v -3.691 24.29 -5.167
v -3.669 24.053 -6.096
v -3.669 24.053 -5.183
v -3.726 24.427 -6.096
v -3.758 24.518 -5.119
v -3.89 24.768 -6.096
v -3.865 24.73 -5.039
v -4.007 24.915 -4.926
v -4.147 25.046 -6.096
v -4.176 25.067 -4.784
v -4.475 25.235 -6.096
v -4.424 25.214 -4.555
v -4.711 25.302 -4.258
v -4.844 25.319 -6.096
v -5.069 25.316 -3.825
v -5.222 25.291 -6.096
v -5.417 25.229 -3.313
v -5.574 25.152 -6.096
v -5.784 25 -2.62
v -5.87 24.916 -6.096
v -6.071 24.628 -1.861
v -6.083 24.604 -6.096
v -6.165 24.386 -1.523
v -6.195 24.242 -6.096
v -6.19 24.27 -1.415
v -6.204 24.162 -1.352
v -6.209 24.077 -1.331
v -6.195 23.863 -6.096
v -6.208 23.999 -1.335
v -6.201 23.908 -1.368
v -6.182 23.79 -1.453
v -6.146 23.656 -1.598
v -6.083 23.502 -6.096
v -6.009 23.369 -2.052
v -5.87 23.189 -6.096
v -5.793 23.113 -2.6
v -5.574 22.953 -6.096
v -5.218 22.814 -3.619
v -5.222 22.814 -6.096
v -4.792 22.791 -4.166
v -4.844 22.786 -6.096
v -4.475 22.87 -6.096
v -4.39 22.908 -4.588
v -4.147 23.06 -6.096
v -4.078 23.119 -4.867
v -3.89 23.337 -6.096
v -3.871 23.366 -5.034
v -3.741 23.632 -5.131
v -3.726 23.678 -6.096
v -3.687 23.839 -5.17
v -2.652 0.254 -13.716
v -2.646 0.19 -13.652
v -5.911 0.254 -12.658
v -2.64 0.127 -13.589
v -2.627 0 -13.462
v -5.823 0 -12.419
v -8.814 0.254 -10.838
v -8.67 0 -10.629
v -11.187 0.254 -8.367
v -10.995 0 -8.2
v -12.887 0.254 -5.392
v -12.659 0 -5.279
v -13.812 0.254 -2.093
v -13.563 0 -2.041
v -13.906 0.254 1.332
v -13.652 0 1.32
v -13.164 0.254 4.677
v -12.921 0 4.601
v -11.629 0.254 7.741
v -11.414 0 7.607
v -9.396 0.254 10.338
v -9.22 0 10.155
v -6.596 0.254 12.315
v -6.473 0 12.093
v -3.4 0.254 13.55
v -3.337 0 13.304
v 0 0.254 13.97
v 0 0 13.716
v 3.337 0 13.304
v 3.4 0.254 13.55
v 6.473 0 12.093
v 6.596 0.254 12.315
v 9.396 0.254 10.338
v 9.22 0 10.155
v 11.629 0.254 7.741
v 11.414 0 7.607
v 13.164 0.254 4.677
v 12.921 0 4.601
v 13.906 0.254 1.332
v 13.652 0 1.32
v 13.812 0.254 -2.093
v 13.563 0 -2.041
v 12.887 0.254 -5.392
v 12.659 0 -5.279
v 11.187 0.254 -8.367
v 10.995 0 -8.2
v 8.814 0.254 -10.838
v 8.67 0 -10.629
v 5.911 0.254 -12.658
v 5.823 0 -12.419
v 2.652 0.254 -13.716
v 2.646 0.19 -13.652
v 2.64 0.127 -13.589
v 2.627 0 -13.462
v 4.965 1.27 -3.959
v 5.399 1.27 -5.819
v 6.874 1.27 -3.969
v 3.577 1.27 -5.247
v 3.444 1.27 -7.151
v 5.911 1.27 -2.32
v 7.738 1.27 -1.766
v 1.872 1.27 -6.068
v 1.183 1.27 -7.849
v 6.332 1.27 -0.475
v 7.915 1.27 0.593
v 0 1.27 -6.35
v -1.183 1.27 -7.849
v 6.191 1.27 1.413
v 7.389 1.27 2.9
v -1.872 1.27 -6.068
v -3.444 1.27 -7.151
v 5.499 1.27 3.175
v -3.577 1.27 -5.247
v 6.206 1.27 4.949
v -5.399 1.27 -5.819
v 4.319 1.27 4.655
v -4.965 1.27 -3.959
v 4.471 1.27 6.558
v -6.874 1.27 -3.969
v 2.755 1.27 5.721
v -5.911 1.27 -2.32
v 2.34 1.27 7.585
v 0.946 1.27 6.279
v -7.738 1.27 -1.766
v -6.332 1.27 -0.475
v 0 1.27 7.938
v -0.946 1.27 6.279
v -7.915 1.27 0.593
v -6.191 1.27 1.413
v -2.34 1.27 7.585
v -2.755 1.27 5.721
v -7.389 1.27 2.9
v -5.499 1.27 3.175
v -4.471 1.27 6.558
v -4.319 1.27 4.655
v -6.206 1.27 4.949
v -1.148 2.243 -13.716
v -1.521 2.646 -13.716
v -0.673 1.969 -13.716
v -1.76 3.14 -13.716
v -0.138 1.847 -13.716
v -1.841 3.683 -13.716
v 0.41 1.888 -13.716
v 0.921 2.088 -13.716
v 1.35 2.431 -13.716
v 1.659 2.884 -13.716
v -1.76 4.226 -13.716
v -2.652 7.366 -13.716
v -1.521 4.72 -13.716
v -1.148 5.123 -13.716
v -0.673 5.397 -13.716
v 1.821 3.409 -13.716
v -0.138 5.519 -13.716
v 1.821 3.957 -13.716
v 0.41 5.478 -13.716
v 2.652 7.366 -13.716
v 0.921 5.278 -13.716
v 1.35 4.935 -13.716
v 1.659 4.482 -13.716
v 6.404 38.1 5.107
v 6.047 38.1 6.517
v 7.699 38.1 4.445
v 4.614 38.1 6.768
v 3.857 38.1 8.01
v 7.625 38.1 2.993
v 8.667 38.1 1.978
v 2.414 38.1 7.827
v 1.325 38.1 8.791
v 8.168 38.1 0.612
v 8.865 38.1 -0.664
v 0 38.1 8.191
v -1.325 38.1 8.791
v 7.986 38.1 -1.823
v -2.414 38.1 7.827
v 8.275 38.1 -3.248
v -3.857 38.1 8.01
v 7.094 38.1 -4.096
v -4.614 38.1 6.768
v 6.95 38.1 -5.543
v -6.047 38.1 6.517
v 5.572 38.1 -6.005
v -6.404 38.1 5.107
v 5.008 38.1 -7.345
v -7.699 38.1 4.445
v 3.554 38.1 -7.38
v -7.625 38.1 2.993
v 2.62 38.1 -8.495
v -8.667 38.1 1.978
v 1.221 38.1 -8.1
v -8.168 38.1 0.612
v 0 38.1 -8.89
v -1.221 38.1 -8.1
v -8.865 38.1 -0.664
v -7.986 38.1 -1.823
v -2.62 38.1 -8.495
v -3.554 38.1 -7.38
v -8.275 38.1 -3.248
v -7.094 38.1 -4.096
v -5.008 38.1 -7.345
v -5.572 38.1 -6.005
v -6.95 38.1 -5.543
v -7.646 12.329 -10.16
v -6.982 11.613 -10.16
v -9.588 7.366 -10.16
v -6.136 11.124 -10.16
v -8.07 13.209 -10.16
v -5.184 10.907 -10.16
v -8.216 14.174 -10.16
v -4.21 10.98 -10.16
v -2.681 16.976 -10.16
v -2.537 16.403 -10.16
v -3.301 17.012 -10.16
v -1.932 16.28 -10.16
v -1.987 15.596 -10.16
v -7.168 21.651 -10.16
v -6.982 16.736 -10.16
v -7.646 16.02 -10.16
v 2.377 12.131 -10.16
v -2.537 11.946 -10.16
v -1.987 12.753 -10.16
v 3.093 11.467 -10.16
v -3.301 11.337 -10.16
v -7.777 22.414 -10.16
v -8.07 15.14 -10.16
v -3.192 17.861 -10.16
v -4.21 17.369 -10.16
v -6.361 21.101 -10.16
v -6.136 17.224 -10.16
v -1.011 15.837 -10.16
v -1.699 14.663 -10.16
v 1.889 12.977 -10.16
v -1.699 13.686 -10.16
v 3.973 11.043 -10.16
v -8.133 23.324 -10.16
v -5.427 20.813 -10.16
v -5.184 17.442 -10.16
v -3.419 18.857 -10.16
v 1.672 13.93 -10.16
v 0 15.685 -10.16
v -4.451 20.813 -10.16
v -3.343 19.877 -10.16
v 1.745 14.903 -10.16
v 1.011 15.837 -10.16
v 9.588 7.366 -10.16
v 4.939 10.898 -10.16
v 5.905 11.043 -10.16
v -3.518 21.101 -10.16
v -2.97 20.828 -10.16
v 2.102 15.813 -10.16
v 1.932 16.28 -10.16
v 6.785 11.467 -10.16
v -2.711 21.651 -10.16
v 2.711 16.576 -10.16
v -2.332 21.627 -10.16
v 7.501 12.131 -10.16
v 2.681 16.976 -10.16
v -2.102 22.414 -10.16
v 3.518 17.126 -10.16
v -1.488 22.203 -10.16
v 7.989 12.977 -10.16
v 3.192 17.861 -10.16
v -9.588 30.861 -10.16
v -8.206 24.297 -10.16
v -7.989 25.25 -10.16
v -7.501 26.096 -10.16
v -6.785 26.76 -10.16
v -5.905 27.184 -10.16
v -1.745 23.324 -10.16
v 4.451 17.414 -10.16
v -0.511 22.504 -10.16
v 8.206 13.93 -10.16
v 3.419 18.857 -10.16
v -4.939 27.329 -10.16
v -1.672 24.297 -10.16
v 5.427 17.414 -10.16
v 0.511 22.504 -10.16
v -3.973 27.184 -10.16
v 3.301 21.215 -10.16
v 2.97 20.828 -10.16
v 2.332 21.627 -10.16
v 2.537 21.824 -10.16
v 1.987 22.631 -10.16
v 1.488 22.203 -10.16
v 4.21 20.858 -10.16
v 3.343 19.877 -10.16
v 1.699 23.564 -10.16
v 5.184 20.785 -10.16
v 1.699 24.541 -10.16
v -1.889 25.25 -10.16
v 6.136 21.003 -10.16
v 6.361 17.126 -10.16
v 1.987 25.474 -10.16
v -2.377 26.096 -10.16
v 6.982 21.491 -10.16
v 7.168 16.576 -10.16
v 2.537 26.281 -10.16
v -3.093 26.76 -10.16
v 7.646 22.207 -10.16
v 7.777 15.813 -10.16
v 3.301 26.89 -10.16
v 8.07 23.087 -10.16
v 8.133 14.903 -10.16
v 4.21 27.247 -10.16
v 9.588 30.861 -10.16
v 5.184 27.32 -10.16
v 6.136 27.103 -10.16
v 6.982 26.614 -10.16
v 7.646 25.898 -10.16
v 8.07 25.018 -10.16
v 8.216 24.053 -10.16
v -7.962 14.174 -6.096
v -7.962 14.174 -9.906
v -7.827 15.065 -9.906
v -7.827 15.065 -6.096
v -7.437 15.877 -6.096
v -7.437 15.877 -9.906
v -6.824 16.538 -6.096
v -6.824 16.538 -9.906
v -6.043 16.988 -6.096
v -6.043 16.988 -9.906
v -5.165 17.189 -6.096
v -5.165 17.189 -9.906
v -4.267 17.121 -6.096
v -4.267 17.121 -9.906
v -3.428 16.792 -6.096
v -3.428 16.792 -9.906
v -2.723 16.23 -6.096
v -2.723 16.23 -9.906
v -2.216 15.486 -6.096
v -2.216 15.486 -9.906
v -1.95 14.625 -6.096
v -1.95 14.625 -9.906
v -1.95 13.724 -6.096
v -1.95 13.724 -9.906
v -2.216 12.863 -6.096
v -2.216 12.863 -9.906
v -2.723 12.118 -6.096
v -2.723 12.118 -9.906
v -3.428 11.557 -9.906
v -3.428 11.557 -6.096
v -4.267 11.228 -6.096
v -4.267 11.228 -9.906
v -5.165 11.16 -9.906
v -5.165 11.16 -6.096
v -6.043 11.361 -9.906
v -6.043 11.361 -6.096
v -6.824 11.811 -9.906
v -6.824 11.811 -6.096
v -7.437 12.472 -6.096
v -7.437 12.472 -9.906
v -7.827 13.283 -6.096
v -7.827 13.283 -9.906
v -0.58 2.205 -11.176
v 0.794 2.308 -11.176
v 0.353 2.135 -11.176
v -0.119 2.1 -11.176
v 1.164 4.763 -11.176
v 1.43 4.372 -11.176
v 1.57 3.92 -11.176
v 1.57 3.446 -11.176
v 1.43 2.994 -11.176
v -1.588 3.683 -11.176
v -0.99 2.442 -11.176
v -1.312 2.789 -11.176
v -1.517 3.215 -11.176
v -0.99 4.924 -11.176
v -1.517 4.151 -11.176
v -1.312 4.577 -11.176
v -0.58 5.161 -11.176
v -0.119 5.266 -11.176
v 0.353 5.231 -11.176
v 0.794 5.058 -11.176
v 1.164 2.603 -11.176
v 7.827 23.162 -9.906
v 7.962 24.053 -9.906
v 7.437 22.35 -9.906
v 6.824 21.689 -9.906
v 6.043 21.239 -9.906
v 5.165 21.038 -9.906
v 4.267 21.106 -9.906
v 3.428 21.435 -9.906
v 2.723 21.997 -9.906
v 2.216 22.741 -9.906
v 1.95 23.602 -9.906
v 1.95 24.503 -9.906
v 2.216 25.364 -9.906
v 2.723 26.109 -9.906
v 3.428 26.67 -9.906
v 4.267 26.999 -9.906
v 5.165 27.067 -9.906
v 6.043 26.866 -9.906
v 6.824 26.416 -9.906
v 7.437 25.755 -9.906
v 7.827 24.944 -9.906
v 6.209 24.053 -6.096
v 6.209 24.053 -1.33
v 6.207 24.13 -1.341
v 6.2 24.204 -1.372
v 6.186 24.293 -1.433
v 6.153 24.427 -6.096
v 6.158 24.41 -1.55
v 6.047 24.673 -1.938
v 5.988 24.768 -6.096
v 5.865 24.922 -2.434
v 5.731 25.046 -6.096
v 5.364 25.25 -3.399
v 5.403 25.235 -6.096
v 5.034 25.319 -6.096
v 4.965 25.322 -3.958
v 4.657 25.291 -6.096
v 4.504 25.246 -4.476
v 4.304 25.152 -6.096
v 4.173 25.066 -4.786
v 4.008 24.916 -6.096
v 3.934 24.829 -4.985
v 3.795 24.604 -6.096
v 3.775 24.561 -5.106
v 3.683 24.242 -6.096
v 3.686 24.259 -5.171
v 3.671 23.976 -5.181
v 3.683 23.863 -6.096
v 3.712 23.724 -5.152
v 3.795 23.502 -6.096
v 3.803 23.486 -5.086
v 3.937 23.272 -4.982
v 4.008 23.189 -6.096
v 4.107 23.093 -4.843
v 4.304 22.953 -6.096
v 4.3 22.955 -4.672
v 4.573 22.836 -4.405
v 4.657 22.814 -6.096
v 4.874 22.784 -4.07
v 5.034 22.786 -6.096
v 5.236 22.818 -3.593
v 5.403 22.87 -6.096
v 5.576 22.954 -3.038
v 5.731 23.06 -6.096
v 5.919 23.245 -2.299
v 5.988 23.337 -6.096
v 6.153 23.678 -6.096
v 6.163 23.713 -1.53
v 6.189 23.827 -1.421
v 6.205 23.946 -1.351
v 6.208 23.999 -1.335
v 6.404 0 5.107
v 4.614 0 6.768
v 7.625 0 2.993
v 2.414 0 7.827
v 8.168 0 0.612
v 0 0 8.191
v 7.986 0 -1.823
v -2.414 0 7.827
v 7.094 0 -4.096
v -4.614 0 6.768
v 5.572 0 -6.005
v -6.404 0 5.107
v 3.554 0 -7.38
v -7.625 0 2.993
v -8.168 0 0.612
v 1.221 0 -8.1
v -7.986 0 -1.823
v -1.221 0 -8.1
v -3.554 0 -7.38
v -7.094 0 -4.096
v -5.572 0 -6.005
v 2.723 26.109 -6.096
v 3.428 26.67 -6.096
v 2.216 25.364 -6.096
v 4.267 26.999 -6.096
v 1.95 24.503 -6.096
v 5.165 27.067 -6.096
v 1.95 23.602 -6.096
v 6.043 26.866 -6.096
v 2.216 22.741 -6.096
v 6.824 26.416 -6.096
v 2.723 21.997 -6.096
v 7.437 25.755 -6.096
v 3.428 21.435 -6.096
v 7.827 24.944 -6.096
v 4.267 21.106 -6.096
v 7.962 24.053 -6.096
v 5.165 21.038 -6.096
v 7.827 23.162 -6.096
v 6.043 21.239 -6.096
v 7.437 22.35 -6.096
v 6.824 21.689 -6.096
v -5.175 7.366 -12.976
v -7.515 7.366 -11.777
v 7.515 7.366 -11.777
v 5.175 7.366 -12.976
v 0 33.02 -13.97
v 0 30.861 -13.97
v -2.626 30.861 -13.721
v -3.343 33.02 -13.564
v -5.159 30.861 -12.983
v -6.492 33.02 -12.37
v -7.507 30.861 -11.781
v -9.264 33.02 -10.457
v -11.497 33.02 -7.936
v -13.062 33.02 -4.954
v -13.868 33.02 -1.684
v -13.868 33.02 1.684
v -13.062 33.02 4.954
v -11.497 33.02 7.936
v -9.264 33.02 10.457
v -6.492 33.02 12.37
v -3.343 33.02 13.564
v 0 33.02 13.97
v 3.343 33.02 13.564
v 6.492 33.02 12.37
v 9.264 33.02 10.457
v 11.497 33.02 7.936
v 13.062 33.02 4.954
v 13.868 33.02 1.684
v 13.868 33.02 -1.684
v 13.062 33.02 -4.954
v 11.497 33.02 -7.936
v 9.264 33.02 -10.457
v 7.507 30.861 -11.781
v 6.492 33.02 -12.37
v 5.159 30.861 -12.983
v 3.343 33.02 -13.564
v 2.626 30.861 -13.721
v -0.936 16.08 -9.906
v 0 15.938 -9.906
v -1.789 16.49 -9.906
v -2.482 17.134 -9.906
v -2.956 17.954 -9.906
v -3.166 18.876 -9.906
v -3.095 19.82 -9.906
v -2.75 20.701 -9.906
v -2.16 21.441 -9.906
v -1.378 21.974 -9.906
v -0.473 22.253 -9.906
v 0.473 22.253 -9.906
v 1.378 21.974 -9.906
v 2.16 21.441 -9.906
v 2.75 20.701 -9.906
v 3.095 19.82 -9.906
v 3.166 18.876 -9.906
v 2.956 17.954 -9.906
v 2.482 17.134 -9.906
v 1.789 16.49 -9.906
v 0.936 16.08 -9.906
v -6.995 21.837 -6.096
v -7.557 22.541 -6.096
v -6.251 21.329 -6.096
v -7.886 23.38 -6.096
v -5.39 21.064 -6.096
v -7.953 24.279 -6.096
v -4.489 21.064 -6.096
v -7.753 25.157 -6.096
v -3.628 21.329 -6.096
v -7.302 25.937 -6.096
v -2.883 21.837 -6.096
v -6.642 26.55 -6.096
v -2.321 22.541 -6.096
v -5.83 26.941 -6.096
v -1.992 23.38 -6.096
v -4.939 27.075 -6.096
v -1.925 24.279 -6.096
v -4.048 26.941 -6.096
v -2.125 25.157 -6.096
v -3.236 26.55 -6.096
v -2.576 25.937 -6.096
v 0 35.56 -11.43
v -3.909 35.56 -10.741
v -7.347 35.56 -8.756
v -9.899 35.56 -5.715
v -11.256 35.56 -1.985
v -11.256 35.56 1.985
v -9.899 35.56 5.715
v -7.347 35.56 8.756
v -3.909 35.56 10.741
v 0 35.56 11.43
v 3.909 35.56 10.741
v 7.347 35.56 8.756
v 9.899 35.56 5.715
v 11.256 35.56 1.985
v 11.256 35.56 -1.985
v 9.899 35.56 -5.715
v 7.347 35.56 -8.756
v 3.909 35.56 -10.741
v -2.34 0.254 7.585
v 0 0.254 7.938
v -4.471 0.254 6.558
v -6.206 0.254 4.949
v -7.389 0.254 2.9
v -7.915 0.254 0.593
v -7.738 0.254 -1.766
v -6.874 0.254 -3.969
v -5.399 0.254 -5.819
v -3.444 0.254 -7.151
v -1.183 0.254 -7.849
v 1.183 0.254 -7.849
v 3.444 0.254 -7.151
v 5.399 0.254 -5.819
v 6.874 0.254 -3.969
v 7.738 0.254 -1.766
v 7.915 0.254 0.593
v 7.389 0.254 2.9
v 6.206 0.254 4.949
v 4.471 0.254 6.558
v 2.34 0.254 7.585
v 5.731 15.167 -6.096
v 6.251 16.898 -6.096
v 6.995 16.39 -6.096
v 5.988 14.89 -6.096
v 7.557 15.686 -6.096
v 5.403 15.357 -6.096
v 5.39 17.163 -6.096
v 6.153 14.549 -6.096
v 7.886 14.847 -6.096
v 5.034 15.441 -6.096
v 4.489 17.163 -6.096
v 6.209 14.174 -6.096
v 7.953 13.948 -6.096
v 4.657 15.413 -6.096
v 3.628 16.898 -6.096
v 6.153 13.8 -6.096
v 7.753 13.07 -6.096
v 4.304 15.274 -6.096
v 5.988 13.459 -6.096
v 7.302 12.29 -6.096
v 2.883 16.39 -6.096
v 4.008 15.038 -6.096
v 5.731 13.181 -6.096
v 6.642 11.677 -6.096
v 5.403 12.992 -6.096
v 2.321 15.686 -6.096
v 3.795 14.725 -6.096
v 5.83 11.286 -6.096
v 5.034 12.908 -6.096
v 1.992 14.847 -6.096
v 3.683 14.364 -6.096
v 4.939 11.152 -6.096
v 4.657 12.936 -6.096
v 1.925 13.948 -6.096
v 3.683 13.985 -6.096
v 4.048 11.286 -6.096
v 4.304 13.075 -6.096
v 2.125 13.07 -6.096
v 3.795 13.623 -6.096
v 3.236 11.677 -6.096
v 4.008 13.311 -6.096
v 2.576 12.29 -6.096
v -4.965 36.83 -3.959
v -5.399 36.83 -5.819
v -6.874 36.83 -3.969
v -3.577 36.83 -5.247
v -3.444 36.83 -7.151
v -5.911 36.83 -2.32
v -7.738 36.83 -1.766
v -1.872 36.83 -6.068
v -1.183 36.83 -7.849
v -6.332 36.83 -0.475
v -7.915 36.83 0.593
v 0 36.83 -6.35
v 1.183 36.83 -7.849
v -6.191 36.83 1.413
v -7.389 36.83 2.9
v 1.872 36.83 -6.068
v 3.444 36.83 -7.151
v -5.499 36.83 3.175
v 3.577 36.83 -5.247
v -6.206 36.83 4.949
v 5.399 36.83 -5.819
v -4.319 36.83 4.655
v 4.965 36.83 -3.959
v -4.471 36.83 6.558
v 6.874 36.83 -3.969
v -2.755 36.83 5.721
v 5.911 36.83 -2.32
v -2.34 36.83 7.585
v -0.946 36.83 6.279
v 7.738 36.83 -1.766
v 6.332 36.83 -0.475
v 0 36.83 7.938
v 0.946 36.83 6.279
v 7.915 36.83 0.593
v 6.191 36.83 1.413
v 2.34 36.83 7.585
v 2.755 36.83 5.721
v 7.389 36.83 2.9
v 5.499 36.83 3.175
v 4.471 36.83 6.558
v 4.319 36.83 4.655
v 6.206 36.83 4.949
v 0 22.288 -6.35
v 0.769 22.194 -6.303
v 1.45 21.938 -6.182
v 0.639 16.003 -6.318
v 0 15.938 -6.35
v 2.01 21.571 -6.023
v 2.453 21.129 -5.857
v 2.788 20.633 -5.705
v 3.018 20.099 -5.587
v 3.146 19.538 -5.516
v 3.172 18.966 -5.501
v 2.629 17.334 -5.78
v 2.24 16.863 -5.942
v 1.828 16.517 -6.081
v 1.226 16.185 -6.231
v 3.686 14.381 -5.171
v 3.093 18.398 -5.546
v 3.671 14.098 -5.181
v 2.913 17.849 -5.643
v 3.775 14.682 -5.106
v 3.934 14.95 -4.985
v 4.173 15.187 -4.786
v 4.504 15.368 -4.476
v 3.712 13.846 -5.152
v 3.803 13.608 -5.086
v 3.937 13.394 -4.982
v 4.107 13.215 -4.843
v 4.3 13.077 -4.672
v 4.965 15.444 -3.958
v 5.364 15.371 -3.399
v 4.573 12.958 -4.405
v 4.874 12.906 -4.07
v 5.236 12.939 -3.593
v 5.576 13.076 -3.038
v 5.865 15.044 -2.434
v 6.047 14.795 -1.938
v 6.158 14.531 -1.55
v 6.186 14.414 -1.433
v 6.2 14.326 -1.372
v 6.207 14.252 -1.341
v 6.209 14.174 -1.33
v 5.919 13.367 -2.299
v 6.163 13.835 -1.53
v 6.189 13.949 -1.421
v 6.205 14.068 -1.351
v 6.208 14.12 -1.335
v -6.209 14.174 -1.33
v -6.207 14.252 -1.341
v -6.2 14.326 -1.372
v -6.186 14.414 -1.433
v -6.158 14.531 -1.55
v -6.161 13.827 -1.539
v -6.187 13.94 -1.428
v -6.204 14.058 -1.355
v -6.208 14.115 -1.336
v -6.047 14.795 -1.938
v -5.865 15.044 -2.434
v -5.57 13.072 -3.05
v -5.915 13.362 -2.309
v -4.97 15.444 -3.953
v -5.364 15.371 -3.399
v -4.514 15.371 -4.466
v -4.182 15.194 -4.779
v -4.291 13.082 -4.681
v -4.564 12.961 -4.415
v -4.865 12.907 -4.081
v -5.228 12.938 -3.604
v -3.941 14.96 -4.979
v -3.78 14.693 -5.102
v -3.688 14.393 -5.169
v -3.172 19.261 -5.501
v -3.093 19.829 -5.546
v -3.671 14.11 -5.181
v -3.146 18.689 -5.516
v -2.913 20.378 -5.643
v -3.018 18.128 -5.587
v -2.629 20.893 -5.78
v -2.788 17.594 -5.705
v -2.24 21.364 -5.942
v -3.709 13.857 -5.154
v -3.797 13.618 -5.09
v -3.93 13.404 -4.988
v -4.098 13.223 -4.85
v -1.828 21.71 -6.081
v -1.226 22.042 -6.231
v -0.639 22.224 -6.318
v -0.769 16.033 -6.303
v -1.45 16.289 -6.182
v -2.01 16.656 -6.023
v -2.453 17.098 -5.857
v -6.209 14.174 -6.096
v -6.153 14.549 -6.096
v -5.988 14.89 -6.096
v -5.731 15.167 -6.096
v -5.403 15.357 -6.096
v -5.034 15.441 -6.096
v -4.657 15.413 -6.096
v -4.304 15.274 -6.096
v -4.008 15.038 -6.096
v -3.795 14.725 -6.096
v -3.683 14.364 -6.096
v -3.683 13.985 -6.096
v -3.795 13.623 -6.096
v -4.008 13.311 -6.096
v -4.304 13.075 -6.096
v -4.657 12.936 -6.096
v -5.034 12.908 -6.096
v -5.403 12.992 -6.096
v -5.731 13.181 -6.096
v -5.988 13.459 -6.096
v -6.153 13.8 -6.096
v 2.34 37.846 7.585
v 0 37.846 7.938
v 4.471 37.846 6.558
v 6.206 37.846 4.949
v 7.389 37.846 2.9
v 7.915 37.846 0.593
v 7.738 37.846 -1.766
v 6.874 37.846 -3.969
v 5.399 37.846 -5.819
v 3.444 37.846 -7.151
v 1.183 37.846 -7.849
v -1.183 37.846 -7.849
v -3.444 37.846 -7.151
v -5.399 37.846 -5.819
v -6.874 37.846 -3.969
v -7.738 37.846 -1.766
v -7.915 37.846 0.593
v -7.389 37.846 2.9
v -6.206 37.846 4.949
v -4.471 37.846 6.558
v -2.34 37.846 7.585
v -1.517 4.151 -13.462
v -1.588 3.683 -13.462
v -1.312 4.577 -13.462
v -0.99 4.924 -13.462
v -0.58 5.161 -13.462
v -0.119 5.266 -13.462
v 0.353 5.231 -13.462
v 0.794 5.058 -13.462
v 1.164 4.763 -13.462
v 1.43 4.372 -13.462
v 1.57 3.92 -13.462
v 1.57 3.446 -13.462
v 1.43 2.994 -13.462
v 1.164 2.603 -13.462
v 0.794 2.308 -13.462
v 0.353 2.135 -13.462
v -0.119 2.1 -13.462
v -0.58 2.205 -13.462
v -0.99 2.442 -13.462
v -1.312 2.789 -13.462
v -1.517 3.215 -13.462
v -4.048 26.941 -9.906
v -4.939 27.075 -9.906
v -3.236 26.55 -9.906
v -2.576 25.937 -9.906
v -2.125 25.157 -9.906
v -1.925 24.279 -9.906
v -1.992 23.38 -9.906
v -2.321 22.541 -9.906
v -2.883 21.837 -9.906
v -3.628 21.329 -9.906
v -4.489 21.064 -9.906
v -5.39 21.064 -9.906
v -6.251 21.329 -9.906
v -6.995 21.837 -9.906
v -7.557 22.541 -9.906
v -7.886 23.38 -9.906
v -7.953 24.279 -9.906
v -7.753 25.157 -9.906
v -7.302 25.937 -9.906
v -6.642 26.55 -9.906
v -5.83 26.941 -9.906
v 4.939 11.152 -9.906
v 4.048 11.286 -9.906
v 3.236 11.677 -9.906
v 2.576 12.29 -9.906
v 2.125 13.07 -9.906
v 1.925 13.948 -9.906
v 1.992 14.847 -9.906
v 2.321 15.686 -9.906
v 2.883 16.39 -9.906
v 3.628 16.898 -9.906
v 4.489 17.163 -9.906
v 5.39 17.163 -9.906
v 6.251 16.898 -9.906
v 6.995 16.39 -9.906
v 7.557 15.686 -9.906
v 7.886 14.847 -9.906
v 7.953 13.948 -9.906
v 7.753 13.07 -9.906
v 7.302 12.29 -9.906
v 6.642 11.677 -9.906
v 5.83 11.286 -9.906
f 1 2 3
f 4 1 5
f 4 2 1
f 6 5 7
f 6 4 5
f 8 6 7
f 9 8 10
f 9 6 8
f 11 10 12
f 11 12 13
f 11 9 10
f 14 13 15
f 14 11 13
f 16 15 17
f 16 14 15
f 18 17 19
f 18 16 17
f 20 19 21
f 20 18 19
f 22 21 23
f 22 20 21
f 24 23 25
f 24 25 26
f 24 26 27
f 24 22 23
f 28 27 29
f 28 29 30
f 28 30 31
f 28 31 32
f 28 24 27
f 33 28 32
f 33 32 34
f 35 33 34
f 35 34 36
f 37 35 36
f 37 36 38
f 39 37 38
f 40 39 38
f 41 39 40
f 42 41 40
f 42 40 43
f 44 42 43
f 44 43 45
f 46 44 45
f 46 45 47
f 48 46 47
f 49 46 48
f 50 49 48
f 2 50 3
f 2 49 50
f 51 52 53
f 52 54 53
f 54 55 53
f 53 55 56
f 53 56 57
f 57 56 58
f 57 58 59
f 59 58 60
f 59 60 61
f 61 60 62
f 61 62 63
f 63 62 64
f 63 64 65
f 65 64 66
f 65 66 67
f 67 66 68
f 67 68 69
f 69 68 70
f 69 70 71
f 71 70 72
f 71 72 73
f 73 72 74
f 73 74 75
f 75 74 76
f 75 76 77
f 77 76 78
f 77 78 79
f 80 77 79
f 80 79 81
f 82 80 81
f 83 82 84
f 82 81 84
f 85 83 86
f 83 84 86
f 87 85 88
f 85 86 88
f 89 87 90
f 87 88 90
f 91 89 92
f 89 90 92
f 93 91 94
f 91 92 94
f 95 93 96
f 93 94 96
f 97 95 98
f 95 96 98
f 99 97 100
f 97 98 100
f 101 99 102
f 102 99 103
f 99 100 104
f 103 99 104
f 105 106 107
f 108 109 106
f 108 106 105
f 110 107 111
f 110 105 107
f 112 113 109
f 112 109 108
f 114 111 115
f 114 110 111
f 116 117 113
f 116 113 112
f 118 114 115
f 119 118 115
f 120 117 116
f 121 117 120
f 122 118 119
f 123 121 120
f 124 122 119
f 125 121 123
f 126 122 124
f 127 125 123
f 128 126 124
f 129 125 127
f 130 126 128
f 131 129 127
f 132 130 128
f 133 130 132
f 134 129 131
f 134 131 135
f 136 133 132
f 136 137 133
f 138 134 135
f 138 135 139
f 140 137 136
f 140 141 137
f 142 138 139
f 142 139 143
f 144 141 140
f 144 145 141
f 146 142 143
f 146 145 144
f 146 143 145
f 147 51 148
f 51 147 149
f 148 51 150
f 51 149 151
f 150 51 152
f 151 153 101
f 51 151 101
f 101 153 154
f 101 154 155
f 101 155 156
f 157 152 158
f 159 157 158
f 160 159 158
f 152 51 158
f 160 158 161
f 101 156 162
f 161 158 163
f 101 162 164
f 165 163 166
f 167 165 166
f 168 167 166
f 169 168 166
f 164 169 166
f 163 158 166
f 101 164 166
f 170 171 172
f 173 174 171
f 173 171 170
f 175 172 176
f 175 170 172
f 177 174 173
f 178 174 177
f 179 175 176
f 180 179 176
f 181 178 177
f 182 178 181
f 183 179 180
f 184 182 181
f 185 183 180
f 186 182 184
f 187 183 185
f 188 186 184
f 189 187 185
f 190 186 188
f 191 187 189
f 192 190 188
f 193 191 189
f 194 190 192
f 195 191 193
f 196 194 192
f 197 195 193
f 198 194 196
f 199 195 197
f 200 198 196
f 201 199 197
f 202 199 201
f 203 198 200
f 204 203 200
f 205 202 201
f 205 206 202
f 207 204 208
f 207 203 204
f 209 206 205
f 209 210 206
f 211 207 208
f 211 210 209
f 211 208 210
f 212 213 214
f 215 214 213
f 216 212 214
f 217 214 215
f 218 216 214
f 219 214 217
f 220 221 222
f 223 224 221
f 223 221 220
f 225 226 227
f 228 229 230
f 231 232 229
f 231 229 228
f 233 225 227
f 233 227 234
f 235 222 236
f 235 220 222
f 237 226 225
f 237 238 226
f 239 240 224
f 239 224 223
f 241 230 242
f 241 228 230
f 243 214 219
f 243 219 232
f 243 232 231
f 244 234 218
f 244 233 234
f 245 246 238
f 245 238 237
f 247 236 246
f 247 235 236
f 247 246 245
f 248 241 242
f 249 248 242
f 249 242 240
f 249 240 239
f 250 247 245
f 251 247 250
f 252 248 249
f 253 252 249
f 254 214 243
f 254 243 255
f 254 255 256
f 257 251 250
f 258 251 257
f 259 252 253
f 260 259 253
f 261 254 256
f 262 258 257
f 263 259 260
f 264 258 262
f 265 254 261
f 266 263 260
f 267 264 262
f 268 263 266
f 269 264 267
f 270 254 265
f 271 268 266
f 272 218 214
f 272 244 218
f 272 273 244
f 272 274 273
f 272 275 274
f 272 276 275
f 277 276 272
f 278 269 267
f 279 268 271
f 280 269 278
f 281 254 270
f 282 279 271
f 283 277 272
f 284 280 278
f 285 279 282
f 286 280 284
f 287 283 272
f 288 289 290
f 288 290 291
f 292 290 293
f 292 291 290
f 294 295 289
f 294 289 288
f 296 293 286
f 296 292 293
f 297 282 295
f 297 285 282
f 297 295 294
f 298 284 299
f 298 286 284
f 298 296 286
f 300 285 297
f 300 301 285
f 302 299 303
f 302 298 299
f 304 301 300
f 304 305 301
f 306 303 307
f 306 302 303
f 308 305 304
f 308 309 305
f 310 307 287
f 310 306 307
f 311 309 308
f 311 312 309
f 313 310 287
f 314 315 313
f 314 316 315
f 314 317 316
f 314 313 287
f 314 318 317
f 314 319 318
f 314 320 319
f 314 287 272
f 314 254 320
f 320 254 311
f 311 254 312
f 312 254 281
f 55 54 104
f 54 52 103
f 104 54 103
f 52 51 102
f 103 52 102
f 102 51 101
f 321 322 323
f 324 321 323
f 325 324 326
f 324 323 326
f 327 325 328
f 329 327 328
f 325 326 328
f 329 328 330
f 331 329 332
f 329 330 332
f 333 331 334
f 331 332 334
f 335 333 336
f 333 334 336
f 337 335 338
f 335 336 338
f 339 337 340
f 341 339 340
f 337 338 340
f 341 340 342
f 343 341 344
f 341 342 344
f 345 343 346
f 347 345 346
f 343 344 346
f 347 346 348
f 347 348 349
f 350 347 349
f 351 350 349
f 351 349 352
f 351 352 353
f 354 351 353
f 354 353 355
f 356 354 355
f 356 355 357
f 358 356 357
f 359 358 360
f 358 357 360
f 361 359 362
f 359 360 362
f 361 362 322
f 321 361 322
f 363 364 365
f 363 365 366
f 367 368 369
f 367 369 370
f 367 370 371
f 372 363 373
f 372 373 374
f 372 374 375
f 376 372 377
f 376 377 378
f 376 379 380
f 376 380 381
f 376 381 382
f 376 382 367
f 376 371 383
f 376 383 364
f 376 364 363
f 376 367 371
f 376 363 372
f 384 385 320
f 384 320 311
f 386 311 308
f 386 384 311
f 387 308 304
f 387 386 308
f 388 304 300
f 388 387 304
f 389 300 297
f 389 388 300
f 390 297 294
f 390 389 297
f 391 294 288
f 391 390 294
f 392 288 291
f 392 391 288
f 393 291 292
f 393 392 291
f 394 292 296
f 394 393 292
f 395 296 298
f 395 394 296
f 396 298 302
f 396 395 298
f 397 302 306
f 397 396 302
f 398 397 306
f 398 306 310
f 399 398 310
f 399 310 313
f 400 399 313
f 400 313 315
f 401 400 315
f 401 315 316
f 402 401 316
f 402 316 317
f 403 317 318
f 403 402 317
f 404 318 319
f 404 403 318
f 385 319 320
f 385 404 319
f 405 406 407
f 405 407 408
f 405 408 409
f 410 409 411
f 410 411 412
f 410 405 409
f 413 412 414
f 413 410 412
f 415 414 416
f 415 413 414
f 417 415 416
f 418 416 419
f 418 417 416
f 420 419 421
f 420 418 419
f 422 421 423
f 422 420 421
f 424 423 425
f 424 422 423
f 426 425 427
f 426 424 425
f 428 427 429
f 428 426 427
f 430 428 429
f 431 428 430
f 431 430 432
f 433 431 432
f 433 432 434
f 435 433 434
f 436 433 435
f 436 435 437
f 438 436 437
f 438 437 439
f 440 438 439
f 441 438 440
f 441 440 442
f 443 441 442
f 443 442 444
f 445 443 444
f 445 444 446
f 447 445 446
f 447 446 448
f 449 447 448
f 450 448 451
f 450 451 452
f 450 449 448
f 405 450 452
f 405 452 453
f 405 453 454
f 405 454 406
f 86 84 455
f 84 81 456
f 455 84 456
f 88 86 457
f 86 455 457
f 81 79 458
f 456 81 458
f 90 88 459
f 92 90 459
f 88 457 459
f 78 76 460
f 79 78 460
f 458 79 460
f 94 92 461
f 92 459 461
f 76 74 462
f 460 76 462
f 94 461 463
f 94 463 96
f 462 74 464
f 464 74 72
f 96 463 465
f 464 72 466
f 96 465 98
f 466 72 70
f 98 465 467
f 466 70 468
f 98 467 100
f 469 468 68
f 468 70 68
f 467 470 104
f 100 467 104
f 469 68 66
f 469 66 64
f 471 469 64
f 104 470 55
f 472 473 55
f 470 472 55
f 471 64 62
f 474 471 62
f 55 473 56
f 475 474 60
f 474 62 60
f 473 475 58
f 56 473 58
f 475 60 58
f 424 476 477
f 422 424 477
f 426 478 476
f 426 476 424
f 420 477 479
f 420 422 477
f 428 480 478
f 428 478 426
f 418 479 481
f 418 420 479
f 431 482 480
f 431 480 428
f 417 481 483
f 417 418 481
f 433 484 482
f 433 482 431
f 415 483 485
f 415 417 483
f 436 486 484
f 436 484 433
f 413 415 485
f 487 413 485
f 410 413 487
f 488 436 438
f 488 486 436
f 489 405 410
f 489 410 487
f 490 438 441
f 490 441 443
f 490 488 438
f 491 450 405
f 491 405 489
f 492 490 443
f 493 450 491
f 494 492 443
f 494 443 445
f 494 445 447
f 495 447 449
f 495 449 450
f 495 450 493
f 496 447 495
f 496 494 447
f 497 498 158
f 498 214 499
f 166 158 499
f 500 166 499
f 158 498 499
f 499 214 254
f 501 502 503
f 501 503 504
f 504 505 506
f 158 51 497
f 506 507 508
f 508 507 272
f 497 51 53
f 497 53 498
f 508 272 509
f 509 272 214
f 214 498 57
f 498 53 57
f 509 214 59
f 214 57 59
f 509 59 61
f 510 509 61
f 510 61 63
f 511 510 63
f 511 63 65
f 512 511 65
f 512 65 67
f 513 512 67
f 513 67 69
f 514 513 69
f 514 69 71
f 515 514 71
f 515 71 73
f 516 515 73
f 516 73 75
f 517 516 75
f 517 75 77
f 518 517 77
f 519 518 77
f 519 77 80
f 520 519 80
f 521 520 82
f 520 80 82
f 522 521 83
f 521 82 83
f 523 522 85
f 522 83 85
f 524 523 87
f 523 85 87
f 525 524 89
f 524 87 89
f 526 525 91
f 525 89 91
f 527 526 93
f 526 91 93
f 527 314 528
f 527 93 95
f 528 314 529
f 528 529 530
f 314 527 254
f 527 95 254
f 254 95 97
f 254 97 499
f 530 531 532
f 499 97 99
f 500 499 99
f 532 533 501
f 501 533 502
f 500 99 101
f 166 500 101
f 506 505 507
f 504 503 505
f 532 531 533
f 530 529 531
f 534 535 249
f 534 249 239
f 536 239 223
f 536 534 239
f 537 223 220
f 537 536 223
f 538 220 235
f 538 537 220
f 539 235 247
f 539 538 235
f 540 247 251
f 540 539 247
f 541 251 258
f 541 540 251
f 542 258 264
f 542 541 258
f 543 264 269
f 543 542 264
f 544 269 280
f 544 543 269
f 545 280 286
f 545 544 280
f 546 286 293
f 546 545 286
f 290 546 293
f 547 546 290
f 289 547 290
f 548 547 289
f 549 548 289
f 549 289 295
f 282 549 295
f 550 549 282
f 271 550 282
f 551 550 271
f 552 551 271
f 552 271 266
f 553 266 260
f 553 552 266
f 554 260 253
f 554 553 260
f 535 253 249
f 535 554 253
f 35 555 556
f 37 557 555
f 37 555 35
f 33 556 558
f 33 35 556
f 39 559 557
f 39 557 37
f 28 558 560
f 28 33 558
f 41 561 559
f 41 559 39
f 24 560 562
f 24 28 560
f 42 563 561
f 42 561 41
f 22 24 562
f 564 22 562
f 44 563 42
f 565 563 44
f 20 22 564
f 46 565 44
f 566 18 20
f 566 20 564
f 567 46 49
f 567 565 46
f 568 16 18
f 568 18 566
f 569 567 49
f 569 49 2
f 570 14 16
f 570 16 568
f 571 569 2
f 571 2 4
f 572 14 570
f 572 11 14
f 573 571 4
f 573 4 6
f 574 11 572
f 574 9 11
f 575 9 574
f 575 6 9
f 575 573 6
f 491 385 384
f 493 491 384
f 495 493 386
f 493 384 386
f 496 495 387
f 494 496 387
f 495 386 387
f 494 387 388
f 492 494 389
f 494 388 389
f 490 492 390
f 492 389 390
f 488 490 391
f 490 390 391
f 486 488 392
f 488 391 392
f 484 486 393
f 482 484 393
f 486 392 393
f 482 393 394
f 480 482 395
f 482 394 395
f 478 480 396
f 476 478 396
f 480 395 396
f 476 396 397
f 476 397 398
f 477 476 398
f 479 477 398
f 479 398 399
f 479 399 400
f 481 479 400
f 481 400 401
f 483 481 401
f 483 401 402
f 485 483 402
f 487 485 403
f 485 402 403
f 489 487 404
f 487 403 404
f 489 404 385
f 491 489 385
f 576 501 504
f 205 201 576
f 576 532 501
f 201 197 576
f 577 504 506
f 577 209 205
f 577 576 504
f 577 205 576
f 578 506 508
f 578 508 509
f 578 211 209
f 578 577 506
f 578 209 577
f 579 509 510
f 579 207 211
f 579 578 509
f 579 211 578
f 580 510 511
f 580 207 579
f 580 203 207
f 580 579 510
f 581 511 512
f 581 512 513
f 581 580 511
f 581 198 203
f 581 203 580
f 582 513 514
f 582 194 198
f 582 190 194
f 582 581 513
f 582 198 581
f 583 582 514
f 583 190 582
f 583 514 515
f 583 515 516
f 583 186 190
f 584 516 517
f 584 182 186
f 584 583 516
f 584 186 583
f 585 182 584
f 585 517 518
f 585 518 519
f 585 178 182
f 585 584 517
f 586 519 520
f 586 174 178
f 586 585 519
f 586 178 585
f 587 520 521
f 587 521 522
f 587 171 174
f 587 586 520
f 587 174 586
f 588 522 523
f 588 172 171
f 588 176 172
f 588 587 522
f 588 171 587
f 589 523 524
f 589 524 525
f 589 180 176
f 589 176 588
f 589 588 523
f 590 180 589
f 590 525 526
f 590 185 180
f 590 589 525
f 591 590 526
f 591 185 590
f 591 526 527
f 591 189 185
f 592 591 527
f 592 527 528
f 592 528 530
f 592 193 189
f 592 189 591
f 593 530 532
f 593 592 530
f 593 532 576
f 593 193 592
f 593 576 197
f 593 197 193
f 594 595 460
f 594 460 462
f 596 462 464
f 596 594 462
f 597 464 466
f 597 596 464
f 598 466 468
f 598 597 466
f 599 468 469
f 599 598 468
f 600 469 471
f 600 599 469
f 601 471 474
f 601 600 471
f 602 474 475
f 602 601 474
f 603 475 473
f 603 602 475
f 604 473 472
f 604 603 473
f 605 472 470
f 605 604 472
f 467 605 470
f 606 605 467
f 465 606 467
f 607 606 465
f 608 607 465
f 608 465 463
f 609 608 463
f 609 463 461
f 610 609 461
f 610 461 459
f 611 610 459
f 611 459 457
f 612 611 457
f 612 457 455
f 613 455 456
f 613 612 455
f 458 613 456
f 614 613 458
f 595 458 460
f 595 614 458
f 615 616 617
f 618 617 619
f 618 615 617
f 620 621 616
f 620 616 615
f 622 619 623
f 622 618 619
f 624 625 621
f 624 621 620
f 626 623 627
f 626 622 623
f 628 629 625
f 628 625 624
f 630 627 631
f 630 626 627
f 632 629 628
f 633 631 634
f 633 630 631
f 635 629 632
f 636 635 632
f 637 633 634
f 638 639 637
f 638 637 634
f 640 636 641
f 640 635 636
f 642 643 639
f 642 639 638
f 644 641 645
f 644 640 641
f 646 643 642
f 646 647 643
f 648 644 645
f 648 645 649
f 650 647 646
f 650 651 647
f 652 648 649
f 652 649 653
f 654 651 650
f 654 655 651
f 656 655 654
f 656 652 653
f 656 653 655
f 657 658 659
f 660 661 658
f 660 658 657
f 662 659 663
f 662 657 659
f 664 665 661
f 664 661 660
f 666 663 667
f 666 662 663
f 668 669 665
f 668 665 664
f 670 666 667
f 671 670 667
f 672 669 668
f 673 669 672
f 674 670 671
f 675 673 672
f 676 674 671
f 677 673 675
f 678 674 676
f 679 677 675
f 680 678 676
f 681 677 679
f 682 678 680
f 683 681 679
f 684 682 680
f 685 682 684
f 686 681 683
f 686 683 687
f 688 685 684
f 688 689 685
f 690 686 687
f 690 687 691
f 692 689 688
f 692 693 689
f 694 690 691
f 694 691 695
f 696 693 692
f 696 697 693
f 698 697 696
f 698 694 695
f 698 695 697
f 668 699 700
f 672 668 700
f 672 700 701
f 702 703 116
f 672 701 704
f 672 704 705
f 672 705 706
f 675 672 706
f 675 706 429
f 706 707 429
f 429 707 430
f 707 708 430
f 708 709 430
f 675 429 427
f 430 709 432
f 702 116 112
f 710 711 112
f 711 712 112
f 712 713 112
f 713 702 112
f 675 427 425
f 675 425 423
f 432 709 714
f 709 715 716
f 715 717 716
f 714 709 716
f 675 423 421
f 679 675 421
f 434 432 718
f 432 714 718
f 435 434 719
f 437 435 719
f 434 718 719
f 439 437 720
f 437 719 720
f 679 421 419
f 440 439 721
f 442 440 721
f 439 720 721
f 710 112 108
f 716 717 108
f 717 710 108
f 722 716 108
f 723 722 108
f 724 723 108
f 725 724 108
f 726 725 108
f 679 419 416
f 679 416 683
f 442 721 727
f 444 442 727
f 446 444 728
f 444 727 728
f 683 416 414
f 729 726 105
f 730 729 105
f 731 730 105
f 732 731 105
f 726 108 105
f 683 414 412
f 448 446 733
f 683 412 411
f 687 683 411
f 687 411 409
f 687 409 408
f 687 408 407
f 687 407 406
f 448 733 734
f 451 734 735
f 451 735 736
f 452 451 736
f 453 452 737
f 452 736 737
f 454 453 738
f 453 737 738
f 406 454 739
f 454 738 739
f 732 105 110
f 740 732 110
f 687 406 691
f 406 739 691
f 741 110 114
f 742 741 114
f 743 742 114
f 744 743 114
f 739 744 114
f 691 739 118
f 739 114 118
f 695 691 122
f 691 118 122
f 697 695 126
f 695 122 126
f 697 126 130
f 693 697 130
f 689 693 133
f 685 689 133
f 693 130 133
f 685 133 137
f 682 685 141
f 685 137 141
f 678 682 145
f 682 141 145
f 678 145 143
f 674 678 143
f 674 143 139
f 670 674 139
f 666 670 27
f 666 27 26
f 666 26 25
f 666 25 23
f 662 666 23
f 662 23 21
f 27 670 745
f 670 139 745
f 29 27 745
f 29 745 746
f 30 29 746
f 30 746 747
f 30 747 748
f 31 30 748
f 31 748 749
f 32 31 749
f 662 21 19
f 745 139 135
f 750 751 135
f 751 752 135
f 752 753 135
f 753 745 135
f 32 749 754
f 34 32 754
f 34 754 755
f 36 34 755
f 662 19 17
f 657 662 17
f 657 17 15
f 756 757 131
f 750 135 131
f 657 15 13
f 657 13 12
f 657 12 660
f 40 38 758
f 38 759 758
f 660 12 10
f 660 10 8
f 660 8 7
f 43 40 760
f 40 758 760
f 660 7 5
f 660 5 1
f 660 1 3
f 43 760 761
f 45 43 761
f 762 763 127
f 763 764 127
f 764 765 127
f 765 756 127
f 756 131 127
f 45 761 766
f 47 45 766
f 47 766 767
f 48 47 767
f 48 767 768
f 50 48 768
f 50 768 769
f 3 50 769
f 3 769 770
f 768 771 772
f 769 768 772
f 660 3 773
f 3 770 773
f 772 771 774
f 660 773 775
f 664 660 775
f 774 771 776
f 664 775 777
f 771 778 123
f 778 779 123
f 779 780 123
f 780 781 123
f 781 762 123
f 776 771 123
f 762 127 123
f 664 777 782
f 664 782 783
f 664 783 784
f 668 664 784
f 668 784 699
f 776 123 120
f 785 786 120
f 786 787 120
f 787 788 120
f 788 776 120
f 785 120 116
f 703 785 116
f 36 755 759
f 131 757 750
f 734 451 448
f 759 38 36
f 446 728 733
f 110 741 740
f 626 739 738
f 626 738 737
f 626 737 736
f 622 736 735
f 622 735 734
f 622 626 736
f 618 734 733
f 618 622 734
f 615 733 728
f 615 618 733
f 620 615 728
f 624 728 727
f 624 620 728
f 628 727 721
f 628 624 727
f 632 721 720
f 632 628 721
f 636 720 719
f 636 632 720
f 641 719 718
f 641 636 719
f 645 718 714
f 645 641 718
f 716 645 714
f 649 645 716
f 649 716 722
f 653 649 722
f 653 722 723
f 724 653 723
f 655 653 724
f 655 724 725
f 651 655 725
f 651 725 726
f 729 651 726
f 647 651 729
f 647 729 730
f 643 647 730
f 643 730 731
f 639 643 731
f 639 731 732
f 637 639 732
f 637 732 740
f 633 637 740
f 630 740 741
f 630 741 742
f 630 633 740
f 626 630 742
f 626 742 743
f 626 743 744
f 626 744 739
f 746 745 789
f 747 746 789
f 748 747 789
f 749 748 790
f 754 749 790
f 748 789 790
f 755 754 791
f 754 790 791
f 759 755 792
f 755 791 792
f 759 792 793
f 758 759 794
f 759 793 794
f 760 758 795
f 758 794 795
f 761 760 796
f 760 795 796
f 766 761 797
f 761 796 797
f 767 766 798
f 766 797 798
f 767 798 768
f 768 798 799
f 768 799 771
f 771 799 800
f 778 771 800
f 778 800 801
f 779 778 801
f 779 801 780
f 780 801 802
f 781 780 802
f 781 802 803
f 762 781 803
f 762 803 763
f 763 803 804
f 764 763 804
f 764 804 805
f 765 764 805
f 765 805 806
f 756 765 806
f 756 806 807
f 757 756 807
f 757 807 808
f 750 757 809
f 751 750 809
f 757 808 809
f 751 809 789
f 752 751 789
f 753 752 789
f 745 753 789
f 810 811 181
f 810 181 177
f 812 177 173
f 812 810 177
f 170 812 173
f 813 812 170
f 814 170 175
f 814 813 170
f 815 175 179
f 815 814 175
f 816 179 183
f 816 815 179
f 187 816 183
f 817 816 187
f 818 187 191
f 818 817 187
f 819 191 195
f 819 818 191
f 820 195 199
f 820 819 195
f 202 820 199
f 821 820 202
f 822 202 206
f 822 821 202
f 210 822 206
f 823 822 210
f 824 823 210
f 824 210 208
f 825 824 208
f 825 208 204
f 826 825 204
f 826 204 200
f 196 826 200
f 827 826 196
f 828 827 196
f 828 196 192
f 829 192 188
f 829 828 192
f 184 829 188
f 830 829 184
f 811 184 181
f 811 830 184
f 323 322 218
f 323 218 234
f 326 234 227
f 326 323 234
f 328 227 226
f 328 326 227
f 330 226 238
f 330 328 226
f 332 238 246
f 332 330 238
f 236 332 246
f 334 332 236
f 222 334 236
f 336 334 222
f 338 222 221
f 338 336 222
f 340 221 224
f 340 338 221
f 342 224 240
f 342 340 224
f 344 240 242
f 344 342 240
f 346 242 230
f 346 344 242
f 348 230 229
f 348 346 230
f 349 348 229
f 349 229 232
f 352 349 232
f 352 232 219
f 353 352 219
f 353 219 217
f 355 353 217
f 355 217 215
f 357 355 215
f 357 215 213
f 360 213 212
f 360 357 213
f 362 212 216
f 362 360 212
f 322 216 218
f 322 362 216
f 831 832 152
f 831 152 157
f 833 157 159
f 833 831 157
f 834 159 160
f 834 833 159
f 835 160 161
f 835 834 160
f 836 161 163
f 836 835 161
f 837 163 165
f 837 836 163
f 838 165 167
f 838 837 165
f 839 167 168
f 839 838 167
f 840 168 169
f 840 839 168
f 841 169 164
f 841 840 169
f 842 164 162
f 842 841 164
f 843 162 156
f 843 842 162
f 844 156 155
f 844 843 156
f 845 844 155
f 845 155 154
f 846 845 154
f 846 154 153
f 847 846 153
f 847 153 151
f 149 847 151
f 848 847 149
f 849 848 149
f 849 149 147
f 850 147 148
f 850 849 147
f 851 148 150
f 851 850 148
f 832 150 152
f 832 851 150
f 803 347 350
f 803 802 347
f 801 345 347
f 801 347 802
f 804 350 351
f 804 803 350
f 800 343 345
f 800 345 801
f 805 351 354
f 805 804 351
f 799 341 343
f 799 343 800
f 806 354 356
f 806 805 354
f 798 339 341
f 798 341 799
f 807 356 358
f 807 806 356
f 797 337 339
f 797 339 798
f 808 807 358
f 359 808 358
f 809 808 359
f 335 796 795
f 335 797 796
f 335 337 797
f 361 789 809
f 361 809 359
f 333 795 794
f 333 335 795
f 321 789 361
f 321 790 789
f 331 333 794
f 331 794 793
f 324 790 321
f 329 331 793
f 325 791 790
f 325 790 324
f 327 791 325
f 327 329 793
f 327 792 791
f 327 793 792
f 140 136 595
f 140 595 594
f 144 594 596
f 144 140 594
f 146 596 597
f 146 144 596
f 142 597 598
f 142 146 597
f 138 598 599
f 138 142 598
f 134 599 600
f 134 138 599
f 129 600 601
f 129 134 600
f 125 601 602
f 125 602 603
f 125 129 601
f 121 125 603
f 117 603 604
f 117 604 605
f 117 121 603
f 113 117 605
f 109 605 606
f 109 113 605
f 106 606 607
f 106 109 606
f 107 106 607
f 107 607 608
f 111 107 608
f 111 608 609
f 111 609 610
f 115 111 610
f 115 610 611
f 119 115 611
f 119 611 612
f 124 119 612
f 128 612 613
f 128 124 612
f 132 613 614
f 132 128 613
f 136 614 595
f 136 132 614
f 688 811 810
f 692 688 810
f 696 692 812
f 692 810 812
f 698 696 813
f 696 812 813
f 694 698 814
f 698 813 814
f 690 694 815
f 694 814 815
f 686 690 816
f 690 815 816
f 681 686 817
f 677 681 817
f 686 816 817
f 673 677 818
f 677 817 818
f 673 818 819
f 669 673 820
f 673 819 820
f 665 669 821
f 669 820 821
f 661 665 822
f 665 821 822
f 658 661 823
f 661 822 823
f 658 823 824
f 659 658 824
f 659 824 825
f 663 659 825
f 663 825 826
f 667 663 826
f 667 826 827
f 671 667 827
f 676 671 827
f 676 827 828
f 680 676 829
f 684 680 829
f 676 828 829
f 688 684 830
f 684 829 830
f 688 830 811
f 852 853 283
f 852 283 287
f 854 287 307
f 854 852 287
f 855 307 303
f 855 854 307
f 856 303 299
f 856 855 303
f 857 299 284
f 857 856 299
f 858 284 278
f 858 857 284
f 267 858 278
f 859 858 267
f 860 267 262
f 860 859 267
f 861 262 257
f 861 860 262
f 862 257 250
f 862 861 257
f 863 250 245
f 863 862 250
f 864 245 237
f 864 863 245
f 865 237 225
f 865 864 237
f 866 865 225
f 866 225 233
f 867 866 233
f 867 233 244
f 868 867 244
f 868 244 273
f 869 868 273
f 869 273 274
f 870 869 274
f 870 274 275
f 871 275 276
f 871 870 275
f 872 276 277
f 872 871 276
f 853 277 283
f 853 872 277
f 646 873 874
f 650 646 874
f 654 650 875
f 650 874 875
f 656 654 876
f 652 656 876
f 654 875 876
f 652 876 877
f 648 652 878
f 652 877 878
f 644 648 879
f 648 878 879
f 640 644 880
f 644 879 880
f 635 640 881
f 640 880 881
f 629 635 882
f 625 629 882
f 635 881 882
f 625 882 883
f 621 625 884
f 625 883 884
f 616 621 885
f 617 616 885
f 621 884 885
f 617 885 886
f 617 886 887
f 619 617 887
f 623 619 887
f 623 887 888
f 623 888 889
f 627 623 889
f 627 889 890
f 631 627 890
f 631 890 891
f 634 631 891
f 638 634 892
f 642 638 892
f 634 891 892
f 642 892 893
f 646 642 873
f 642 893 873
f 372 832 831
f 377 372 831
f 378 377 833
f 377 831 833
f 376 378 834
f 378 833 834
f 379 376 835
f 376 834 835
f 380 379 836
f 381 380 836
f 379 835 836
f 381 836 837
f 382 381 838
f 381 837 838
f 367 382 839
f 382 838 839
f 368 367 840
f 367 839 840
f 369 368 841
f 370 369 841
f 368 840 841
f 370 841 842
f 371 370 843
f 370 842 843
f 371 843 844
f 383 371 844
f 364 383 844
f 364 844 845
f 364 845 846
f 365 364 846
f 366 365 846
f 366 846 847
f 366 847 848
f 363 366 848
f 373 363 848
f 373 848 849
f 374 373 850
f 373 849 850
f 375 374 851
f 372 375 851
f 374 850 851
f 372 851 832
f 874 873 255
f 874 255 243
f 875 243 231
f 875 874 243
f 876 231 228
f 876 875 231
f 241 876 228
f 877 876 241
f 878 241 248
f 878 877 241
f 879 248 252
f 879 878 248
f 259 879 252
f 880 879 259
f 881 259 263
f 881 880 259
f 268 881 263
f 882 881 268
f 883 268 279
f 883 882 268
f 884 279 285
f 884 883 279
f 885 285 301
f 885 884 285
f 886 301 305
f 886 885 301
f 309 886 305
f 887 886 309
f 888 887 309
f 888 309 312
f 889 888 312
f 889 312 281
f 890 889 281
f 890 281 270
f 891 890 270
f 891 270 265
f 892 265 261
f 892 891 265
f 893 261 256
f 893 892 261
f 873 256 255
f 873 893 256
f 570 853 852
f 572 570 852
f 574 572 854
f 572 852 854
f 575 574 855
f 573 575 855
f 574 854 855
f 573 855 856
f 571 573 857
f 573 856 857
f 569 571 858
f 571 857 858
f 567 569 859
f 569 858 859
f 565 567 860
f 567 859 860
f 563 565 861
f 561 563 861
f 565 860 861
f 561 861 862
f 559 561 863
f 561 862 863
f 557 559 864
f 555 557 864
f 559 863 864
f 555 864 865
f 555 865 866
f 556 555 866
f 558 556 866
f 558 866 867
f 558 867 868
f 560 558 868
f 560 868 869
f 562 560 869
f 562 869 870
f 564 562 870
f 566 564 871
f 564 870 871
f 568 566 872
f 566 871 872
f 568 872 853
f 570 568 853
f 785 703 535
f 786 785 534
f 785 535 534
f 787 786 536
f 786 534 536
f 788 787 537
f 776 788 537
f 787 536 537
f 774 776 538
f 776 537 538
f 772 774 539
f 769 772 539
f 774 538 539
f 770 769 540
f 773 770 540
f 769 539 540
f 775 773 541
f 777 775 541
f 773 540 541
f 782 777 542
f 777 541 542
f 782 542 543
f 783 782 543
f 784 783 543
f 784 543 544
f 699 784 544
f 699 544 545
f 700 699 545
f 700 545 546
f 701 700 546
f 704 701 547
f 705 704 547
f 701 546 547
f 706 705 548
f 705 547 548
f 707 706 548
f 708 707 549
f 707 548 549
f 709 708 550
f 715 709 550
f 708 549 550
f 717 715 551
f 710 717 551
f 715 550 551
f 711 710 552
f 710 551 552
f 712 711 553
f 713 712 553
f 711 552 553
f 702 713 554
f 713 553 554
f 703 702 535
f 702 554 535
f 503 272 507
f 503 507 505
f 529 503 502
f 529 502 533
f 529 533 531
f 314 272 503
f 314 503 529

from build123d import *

# Parameters (mm, degrees)
SKETCH2_R               = 13.97
BOSS_EXTRUDE1_DEPTH     = 38.1
CHAMFER1_SIZE           = 5.08
SKETCH4_R               = 6.35
CUT_EXTRUDE1_DEPTH      = 127
SKETCH5_R               = 7.9375
CUT_EXTRUDE2_DEPTH      = 1.27
CUT_EXTRUDE3_START      = -1.27
SKETCH6_R               = 7.9375
CUT_EXTRUDE3_DEPTH      = 1.27
SKETCH8_W               = 3.81
SKETCH8_H               = 23.495
CUT_EXTRUDE4_DEPTH      = 12.7
SKETCH9_W               = 12.7
SKETCH9_H               = 0.508
CUT_EXTRUDE5_DEPTH      = 9.525
SKETCH10_R              = 1.5875
CUT_EXTRUDE6_DEPTH      = 2.54
SKETCH11_R              = 3.175
CUT_EXTRUDE7_DEPTH      = 6.35
SKETCH12_R              = 3.0226
CUT_EXTRUDE8_DEPTH      = 4.064
CIRPATTERN1_COUNT       = 4
CUT_EXTRUDE9_REACH      = 47.27
CUT_EXTRUDE9_END_RADIUS = 6.35
SKETCH13_R              = 1.27
CIRPATTERN2_START       = -6.096
CIRPATTERN2_OUTLINE_R   = 1.27
CIRPATTERN2_DEPTH       = 6.096
CHAMFER2_SIZE           = 0.254


with BuildPart() as part:
    # Sketch2 → Boss-Extrude1 (new body)
    with BuildSketch(Plane(origin=(0, 0, 0), x_dir=(1, 0, 0), z_dir=(0, 1, 0))):
        with Locations(Location((0, 0, 0), (0, 0, 90))):
            Circle(SKETCH2_R)
    extrude(amount=BOSS_EXTRUDE1_DEPTH)

    # Chamfer1
    chamfer1_edges = [part.edges().sort_by_distance(p)[0] for p in [
        (0, 38.1, 13.97),
    ]]
    chamfer(chamfer1_edges, length=CHAMFER1_SIZE)

    # Sketch4 → Cut-Extrude1 (cut)
    with BuildSketch(Plane.XZ):
        with Locations(Location((0, 0, 0), (0, 0, 270))):
            Circle(SKETCH4_R)
    extrude(amount=-CUT_EXTRUDE1_DEPTH, mode=Mode.SUBTRACT)

    # Sketch5 → Cut-Extrude2 (cut)
    with BuildSketch(Plane(origin=(0, 38.1, 0), x_dir=(1, 0, 0), z_dir=(0, 1, 0))):
        with Locations(Location((0, 0, 0), (0, 0, 270))):
            Circle(SKETCH5_R)
    extrude(amount=-CUT_EXTRUDE2_DEPTH, mode=Mode.SUBTRACT)

    # Sketch6 → Cut-Extrude3 (cut)
    with BuildSketch(Plane.XZ.offset(CUT_EXTRUDE3_START)):
        with Locations(Location((0, 0, 0), (0, 0, 90))):
            Circle(SKETCH6_R)
    extrude(amount=CUT_EXTRUDE3_DEPTH, mode=Mode.SUBTRACT)

    # Sketch8 → Cut-Extrude4 (cut, symmetric)
    with BuildSketch(Plane(origin=(0, 0, 0), x_dir=(0, 0, -1), z_dir=(1, 0, 0))):
        with Locations((12.065, 19.1135)):
            Rectangle(SKETCH8_W, SKETCH8_H)
    extrude(amount=CUT_EXTRUDE4_DEPTH, both=True, mode=Mode.SUBTRACT)

    # Sketch9 → Cut-Extrude5 (cut, symmetric)
    with BuildSketch(Plane(origin=(0, 0, 0), x_dir=(1, 0, 0), z_dir=(0, 1, 0))):
        with Locations((0, 13.97)):
            Rectangle(SKETCH9_W, SKETCH9_H)
    extrude(amount=CUT_EXTRUDE5_DEPTH, both=True, mode=Mode.SUBTRACT)

    # Sketch10 → Cut-Extrude6 (cut, symmetric)
    with BuildSketch(Plane(origin=(0, 0, -13.716), x_dir=(-1, 0, 0), z_dir=(0, 0, -1))):
        with Locations((0, 3.683)):
            Circle(SKETCH10_R)
    extrude(amount=CUT_EXTRUDE6_DEPTH, both=True, mode=Mode.SUBTRACT)

    # Sketch11 → Cut-Extrude7 (cut, symmetric)
    with BuildSketch(Plane(origin=(0, 0, -10.16), x_dir=(-1, 0, 0), z_dir=(0, 0, -1))):
        with Locations(Location((0, 19.1135, 0), (0, 0, 270))):
            Circle(SKETCH11_R)
    extrude(amount=CUT_EXTRUDE7_DEPTH, both=True, mode=Mode.SUBTRACT)

    # Sketch12 → Cut-Extrude8 (cut)
    with BuildSketch(Plane(origin=(0, 0, -10.16), x_dir=(-1, 0, 0), z_dir=(0, 0, -1))):
        with Locations(Location((4.939140867, 24.052640867, 0), (0, 0, 90))):
            Circle(SKETCH12_R)
    cut_extrude8 = extrude(amount=-CUT_EXTRUDE8_DEPTH, mode=Mode.SUBTRACT)

    # CirPattern1: Cut-Extrude8 ×4 about axis
    cirpattern1_axis = Axis((0, 19.1135, 0), (0, 0, 1))
    for i in range(1, CIRPATTERN1_COUNT):
        add(cut_extrude8.rotate(cirpattern1_axis, i * 360 / CIRPATTERN1_COUNT), mode=Mode.SUBTRACT)

    # Cut-Extrude9: up to this cylinder (the profile starts outside it)
    cut_extrude9_end = Plane(origin=(0, 14.174359, 0), z_dir=(0, -1, 0)) * Cylinder(CUT_EXTRUDE9_END_RADIUS, 108.24, mode=Mode.PRIVATE)
    # Sketch13 → Cut-Extrude9 (cut, up to the surface)
    with BuildSketch(Plane(origin=(0, 0, -6.096), x_dir=(-1, 0, 0), z_dir=(0, 0, -1)), mode=Mode.PRIVATE) as cut_extrude9_sk1:
        with Locations((4.939140867, 14.174359133)):
            Circle(SKETCH13_R)
    cut_extrude9_tool1 = extrude(cut_extrude9_sk1.sketch, amount=-CUT_EXTRUDE9_REACH, mode=Mode.PRIVATE) - cut_extrude9_end
    add(cut_extrude9_tool1.solids().sort_by_distance((-4.939141, 14.174359, -6.096))[0], mode=Mode.SUBTRACT)

    # CirPattern2: read off the stored shape, not the designer's step
    # CirPattern2 outline → CirPattern2 (cut)
    with BuildSketch(Plane.XY.offset(CIRPATTERN2_START)):
        with Locations((-4.939140867, 24.052640867)):
            Circle(CIRPATTERN2_OUTLINE_R)
        with Locations((4.939140867, 24.052640867)):
            Circle(CIRPATTERN2_OUTLINE_R)
        with Locations((4.939140867, 14.174359133)):
            Circle(CIRPATTERN2_OUTLINE_R)
    extrude(amount=CIRPATTERN2_DEPTH, mode=Mode.SUBTRACT)

    # Chamfer2
    chamfer2_edges = [part.edges().sort_by_distance(p)[0] for p in [
        (0, 38.1, -7.9375),
        (0, 0, -7.9375),
        (0, 0, 13.97),
        (0, 0, -13.716),
        (1.5875, 3.683, -13.716),
        (0, 22.2885, -10.16),
        (-4.939140867, 21.030040867, -10.16),
        (-1.916540867, 14.174359133, -10.16),
        (4.939140867, 17.196959133, -10.16),
        (1.916540867, 24.052640867, -10.16),
    ]]
    chamfer(chamfer2_edges, length=CHAMFER2_SIZE - 0.0001)  # a hair under: the kernel refuses the full size


solid = part.part
